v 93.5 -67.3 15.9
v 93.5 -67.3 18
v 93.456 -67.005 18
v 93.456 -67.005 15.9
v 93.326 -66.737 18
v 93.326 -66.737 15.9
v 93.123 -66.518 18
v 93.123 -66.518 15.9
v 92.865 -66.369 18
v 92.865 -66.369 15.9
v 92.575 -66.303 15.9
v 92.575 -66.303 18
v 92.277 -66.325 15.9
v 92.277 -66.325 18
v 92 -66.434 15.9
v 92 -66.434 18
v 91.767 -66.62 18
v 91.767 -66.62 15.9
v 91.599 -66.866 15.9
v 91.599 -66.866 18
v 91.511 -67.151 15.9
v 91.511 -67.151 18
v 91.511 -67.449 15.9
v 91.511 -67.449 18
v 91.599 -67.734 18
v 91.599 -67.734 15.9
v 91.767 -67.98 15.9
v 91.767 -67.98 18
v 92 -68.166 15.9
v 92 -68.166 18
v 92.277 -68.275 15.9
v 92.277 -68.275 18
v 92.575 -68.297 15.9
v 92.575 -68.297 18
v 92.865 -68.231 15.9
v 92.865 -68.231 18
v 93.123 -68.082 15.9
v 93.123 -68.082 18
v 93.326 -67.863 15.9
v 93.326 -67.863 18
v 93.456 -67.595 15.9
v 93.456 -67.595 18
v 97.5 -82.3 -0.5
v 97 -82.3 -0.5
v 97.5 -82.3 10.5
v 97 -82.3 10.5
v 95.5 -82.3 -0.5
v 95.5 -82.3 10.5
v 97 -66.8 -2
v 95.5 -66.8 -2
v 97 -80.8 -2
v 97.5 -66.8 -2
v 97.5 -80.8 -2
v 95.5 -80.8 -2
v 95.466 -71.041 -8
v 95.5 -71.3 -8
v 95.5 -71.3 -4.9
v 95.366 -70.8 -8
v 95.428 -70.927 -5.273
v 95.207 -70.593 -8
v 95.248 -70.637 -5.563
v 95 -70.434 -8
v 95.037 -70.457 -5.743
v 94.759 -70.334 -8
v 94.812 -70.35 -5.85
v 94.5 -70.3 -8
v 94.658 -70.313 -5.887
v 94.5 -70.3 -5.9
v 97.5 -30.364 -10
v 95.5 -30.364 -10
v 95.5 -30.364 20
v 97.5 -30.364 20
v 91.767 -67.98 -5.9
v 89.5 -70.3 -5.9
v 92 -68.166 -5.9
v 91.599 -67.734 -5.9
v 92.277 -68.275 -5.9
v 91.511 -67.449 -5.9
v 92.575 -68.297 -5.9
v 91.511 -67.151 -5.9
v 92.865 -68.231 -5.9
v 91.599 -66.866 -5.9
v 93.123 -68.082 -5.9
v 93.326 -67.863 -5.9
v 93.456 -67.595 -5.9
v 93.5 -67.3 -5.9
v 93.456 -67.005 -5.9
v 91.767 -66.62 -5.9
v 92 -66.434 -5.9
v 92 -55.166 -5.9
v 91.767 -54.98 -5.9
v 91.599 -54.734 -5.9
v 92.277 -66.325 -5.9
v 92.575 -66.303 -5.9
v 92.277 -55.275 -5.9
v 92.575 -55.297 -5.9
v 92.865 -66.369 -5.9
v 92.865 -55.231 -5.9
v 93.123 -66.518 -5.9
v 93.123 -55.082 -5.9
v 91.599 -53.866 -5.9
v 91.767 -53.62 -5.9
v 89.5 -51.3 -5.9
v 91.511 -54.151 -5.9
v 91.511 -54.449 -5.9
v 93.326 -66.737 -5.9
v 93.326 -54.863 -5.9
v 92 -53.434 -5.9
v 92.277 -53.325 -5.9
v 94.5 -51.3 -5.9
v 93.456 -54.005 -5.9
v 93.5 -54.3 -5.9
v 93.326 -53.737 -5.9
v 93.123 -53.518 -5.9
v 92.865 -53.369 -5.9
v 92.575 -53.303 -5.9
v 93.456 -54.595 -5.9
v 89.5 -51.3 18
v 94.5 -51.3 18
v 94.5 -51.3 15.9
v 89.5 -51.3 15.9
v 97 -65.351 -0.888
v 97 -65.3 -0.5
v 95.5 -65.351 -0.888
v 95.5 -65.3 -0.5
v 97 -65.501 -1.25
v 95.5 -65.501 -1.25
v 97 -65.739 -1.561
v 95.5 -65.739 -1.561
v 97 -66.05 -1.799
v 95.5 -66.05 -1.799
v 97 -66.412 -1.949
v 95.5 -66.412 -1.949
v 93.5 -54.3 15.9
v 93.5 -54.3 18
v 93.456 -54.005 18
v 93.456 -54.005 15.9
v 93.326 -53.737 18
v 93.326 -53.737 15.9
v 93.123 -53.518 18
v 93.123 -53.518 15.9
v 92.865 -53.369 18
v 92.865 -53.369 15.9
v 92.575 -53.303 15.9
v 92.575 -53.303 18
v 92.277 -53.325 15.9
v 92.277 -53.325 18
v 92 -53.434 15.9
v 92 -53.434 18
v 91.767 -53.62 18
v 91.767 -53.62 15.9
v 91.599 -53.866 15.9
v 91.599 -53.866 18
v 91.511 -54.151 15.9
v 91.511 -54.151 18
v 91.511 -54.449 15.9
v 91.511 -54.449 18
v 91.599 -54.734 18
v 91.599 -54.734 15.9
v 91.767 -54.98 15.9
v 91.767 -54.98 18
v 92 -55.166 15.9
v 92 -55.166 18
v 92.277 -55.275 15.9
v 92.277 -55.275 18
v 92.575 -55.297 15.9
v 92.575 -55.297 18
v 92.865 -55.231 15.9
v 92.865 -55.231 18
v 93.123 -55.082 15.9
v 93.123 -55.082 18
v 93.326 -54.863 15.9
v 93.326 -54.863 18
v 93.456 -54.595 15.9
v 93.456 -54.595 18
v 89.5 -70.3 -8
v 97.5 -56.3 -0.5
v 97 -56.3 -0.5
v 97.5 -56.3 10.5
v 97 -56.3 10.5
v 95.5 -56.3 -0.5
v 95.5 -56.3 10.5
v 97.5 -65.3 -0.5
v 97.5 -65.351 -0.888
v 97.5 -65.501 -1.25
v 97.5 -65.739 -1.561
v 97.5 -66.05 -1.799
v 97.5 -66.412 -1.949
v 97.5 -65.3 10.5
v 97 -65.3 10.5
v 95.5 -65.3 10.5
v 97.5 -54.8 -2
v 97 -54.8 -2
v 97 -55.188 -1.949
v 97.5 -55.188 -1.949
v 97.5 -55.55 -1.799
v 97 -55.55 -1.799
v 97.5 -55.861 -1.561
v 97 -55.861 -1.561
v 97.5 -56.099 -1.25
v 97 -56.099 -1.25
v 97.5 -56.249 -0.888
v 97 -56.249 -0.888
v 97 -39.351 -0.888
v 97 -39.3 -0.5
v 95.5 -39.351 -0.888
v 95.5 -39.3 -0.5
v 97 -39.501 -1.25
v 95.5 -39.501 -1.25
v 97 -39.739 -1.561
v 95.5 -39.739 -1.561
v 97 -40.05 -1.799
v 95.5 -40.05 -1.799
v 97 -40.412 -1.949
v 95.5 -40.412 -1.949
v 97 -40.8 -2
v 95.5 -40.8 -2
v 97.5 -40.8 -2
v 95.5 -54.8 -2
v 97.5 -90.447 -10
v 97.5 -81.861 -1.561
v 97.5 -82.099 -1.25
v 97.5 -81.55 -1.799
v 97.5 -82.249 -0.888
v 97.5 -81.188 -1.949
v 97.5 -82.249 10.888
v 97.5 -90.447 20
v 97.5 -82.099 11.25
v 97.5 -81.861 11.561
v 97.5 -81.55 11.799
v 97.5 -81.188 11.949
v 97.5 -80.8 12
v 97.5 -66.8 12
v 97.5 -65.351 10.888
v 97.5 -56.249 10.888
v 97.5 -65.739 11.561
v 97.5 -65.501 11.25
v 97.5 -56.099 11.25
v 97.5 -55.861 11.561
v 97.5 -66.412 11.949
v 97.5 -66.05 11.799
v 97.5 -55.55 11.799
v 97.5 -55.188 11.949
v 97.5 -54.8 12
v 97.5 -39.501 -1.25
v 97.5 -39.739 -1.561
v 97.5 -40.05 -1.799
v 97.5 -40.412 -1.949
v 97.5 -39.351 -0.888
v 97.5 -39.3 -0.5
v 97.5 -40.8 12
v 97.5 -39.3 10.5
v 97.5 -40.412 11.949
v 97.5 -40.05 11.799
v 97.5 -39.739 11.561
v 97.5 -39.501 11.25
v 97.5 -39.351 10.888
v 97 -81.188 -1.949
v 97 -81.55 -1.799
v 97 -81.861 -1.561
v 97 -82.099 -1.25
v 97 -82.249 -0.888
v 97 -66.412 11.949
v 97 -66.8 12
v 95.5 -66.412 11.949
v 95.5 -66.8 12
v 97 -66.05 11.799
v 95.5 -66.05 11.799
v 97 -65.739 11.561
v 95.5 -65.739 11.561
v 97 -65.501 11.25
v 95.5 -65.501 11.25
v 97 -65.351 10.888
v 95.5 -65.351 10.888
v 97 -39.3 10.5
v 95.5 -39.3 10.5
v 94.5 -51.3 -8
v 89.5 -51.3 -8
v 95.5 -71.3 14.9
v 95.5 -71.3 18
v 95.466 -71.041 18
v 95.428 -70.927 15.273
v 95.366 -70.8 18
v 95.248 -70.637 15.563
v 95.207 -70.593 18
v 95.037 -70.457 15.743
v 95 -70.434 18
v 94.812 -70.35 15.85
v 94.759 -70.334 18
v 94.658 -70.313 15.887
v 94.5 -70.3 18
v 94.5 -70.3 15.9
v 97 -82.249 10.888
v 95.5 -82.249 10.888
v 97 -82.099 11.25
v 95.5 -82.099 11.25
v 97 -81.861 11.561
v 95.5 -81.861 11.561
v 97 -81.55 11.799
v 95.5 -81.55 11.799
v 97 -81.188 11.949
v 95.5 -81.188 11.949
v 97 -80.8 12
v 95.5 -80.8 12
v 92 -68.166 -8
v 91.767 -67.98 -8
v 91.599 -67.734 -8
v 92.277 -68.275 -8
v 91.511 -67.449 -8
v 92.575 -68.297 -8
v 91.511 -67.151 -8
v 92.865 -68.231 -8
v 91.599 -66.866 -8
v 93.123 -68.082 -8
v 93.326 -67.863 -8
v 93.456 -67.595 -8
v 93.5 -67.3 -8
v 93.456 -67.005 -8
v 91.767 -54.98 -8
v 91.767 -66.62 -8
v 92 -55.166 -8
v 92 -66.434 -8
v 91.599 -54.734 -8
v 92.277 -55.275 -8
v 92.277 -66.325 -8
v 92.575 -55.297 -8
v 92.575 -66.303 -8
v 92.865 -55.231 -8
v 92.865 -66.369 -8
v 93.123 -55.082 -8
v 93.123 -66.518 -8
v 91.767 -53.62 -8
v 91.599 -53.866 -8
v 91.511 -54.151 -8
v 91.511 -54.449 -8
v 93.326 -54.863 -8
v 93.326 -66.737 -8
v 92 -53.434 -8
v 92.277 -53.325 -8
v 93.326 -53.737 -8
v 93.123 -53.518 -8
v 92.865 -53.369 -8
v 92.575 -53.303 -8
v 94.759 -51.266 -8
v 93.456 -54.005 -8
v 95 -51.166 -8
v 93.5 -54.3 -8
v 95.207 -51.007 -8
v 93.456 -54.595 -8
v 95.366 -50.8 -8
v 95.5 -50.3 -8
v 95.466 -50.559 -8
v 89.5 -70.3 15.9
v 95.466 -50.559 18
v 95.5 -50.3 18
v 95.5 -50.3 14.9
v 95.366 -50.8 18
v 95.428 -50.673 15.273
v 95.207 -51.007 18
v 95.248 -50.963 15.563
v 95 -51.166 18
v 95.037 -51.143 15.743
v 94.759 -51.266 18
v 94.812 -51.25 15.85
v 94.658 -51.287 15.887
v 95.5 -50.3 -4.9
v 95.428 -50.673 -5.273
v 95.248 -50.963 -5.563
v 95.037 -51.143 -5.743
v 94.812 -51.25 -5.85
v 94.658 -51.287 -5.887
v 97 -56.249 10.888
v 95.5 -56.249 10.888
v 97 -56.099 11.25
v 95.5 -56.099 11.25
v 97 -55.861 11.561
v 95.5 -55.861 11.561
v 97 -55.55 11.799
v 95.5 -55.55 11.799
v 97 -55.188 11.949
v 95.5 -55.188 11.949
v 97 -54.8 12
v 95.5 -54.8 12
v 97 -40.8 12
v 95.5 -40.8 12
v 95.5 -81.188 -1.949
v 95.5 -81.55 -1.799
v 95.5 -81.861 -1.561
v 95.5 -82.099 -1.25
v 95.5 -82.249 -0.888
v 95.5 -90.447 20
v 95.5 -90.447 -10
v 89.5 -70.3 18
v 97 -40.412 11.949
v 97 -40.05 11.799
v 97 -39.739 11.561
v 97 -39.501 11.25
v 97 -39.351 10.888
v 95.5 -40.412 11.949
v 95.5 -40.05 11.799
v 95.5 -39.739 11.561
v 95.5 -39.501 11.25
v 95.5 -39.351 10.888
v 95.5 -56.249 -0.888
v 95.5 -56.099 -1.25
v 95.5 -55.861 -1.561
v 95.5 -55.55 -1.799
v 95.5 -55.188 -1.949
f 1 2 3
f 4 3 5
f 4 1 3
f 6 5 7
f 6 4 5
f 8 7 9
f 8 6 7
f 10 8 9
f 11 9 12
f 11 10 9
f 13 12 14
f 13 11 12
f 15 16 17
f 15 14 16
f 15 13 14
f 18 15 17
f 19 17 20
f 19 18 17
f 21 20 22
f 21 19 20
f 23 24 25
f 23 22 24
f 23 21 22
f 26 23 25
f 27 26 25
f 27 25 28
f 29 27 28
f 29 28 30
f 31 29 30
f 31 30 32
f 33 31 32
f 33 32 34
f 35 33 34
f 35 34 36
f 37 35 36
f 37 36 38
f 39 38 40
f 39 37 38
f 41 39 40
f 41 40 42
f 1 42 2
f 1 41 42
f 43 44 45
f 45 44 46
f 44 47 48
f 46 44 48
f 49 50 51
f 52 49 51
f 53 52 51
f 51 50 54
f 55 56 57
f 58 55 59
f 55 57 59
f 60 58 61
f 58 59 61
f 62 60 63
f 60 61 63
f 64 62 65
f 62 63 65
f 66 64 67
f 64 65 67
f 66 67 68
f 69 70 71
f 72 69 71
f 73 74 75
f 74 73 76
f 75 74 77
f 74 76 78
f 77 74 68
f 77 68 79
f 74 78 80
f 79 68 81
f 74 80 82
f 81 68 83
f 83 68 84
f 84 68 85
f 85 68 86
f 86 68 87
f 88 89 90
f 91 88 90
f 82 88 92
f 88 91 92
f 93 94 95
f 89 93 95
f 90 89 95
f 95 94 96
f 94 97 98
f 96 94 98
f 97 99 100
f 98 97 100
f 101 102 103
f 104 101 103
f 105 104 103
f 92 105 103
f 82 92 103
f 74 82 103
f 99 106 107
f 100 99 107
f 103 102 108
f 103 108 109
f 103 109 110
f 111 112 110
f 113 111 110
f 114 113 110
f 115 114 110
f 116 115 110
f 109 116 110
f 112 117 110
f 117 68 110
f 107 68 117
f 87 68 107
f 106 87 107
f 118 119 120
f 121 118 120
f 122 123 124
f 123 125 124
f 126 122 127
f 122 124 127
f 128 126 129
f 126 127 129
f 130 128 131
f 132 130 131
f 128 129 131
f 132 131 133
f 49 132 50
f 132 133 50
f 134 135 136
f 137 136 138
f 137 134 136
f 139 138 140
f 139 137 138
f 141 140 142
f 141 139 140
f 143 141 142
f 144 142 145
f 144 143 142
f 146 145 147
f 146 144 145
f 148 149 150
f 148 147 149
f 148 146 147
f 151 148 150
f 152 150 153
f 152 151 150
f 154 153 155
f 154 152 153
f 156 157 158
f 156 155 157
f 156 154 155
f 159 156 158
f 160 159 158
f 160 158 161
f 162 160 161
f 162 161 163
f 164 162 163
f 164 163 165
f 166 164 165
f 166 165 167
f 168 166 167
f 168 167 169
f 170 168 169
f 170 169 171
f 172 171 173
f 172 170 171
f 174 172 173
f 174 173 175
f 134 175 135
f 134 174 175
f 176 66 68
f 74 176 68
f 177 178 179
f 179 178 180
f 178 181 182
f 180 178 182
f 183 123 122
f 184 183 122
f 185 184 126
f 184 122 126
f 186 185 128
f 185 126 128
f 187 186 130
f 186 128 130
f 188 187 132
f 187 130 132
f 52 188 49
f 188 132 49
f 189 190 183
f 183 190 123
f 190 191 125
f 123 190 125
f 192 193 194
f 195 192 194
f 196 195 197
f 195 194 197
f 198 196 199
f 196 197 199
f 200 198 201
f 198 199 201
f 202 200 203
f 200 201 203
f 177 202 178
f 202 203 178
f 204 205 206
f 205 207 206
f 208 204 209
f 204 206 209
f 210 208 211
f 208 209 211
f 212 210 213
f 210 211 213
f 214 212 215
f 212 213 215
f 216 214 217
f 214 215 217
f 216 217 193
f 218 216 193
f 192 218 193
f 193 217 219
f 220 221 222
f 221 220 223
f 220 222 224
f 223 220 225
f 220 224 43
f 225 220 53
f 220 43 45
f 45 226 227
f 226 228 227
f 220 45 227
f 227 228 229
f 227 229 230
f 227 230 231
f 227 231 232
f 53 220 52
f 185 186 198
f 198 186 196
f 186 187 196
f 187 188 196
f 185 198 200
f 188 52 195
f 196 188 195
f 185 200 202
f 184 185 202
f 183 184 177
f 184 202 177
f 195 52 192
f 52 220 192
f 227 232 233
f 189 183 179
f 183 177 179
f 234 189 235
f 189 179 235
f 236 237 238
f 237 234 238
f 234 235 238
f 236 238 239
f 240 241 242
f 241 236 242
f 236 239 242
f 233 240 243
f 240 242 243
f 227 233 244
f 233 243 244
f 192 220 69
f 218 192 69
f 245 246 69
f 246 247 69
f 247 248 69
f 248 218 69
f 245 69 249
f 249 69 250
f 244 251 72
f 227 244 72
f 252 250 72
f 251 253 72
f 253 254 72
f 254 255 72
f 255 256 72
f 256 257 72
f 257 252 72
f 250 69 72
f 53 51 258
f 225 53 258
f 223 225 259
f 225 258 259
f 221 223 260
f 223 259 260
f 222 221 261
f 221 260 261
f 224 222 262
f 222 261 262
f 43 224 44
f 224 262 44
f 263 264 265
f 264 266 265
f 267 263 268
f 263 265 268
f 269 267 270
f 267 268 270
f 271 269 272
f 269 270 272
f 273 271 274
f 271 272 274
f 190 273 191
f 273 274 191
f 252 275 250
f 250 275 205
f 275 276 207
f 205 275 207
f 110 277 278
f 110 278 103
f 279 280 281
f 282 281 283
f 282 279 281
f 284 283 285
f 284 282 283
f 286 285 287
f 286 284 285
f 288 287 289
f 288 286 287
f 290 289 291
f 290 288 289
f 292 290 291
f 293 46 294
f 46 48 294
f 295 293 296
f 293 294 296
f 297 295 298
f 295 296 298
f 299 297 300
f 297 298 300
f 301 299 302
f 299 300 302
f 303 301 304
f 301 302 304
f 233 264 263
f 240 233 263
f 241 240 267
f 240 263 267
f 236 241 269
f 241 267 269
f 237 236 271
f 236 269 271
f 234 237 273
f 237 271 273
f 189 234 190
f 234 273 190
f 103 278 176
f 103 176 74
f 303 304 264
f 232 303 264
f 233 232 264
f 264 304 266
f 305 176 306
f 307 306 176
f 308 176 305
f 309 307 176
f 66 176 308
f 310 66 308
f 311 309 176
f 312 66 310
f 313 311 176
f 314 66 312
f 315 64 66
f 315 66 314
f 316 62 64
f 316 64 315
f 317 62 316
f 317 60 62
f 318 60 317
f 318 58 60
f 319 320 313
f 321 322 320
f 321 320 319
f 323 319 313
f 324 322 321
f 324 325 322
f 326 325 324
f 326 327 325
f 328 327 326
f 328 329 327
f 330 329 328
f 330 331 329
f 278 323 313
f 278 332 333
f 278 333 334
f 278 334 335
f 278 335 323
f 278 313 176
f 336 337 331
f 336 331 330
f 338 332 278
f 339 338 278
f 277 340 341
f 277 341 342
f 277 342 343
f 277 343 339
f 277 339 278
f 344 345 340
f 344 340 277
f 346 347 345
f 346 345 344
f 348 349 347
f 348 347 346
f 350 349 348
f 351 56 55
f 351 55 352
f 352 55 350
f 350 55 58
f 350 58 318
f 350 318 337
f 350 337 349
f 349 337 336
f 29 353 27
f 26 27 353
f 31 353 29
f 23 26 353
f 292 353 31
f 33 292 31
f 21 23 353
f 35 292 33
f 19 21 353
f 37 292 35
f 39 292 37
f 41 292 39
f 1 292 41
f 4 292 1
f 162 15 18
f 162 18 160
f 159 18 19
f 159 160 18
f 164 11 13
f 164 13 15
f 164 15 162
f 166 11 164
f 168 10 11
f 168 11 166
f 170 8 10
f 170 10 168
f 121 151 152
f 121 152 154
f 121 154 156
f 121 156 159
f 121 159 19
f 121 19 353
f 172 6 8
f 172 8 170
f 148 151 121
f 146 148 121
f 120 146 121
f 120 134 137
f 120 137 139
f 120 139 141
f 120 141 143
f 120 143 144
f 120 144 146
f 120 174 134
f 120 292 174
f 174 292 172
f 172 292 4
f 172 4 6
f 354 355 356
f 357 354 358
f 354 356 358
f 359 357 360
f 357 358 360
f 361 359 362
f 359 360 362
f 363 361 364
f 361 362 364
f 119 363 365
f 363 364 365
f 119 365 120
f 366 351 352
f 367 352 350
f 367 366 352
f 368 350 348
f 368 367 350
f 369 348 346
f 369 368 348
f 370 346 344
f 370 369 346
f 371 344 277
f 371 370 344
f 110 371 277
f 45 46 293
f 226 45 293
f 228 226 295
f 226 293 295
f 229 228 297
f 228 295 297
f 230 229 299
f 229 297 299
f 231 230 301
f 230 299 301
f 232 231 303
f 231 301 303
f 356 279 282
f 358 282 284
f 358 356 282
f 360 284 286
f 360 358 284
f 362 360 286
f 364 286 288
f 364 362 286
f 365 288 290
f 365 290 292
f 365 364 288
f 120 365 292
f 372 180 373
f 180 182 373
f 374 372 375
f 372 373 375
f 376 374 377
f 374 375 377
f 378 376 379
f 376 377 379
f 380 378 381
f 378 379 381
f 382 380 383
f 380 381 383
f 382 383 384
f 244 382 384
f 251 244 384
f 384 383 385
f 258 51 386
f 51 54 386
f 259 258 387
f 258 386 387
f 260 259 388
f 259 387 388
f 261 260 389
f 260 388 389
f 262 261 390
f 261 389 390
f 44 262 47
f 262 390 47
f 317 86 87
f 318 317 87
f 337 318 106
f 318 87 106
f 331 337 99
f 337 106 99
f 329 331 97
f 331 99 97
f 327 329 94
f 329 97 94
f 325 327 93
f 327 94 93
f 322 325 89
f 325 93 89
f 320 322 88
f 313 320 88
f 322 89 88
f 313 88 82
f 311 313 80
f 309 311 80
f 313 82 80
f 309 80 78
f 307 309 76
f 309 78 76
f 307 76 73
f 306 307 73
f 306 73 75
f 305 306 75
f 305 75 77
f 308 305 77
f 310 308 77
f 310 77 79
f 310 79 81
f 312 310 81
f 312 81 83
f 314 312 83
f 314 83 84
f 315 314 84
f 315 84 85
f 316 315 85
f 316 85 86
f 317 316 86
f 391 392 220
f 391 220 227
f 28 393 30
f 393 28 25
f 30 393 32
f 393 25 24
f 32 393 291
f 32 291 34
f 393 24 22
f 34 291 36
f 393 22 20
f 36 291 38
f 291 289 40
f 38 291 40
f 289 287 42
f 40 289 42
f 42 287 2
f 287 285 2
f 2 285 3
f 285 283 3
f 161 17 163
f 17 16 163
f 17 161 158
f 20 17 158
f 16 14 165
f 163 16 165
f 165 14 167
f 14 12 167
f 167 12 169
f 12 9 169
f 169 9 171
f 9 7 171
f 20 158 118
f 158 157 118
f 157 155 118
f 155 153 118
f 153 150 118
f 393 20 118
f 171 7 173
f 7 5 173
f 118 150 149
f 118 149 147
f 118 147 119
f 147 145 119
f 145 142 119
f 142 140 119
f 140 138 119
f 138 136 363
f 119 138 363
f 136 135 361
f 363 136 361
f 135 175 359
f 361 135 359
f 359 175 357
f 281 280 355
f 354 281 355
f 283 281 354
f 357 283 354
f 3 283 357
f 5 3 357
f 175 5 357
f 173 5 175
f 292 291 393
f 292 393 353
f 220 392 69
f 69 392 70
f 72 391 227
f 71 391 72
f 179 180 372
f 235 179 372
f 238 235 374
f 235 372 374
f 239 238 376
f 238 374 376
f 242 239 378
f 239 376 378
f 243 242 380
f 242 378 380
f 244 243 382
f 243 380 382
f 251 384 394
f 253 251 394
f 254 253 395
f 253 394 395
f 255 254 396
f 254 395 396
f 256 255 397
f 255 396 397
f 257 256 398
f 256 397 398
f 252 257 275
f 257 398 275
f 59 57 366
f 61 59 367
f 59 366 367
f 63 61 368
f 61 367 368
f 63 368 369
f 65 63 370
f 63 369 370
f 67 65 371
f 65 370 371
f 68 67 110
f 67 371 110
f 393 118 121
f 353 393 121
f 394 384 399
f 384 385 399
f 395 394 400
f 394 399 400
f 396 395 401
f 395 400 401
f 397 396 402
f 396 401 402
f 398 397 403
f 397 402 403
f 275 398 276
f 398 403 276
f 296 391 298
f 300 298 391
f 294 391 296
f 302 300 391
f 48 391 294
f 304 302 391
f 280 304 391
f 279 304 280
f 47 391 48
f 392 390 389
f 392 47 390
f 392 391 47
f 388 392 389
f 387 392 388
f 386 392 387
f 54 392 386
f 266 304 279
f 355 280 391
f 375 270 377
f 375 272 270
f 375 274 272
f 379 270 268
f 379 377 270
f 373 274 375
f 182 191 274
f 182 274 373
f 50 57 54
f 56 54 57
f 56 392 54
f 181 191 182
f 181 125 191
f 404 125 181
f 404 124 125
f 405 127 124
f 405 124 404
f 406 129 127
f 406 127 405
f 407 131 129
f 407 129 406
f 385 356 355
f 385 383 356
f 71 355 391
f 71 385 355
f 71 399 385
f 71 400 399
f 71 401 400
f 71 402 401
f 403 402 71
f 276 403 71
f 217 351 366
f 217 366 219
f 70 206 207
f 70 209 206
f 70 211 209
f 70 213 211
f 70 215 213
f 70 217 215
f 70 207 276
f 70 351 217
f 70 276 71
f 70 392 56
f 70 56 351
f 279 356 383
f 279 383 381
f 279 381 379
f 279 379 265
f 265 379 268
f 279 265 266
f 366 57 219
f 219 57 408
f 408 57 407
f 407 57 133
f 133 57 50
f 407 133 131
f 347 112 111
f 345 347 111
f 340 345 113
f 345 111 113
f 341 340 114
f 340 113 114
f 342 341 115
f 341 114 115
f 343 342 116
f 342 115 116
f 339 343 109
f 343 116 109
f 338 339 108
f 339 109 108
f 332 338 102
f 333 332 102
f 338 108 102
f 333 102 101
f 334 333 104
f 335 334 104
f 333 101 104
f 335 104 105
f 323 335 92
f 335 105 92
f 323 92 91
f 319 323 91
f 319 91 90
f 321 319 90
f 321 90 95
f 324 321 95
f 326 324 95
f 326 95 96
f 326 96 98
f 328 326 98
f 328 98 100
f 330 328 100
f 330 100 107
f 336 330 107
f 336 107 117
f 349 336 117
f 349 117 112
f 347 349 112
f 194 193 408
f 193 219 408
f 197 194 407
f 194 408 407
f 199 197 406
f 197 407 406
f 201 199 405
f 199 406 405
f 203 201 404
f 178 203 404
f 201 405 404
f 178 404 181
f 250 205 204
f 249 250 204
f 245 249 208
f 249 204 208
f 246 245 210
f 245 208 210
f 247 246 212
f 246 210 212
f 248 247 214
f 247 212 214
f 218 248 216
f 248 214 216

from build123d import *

# Parameters (mm, degrees)
CUT_EXTRUDE8_START       = -10
CUT_EXTRUDE8_OUTLINE_W   = 1.5
CUT_EXTRUDE8_OUTLINE_H   = 9
CUT_EXTRUDE8_DEPTH       = 30
CUT_EXTRUDE8_2_OUTLINE_W = 1.5
CUT_EXTRUDE8_2_OUTLINE_H = 17
CUT_EXTRUDE8_2_DEPTH     = 9.5
CUT_EXTRUDE8_START_2     = 10.5
CUT_EXTRUDE8_3_OUTLINE_W = 1.5
CUT_EXTRUDE8_3_OUTLINE_H = 17
CUT_EXTRUDE8_3_DEPTH     = 9.5
CUT_EXTRUDE9_START       = -2
CUT_EXTRUDE9_DEPTH       = 3
SKETCH8_W                = 44.763309207
SKETCH8_H                = 3.029199698
CUT_EXTRUDE10_DEPTH      = 21
SKETCH9_W                = 30
SKETCH9_H                = 60.083837712
BOSS_EXTRUDE3_DEPTH      = 2
SKETCH13_W               = 2.1
SKETCH13_H               = 19
BOSS_EXTRUDE5_DEPTH      = 6
SKETCH14_R               = 1
CUT_EXTRUDE12_DEPTH      = 6
FILLET1_R                = 1
FILLET1_OF_MIRROR1_R     = 1


with BuildPart() as part:
    # Cut-Extrude8: read off the stored shape, not the designer's step
    # Cut-Extrude8 outline → Cut-Extrude8 (new body)
    with BuildSketch(Plane.XY.offset(CUT_EXTRUDE8_START)):
        with BuildLine():
            Line((97, -39.3), (97, -32.3))
            ThreePointArc((97, -32.3), (96.58113883, -31.075255129), (95.5, -30.363508327))
            Line((95.5, -30.363508327), (95.5, -39.3))
            Line((95.5, -39.3), (97, -39.3))
        make_face()
        with Locations((96.25, -60.8)):
            Rectangle(CUT_EXTRUDE8_OUTLINE_W, CUT_EXTRUDE8_OUTLINE_H)
        with BuildLine():
            Line((97, -90.447346039), (97, -82.3))
            Line((97, -82.3), (95.5, -82.3))
            Line((95.5, -82.3), (95.5, -94.921216129))
            Line((95.5, -94.921216129), (96.879385242, -91.131386325))
            ThreePointArc((96.879385242, -91.131386325), (96.969615506, -90.794642394), (97, -90.447346039))
        make_face()
    extrude(amount=CUT_EXTRUDE8_DEPTH)

    # Cut-Extrude8 2 outline → Cut-Extrude8 2 (add)
    with BuildSketch(Plane.XY.offset(CUT_EXTRUDE8_START)):
        with Locations((96.25, -47.8)):
            Rectangle(CUT_EXTRUDE8_2_OUTLINE_W, CUT_EXTRUDE8_2_OUTLINE_H)
        with Locations((96.25, -73.8)):
            Rectangle(CUT_EXTRUDE8_2_OUTLINE_W, CUT_EXTRUDE8_2_OUTLINE_H)
    extrude(amount=CUT_EXTRUDE8_2_DEPTH)

    # Cut-Extrude8 3 outline → Cut-Extrude8 3 (add)
    with BuildSketch(Plane.XY.offset(CUT_EXTRUDE8_START_2)):
        with Locations((96.25, -47.8)):
            Rectangle(CUT_EXTRUDE8_3_OUTLINE_W, CUT_EXTRUDE8_3_OUTLINE_H)
        with Locations((96.25, -73.8)):
            Rectangle(CUT_EXTRUDE8_3_OUTLINE_W, CUT_EXTRUDE8_3_OUTLINE_H)
    extrude(amount=CUT_EXTRUDE8_3_DEPTH)

    # Cut-Extrude8 4: loft between two sections, ruled curve by curve
    cut_extrude8_4_from = [
        Edge.make_three_point_arc((94.954911098, -94.722819994, 16.513911403), (95.320152625, -93.719327147, 16.565596562), (95.497858615, -93.231083953, 17.5)),
        Edge.make_three_point_arc((95.497858615, -93.231083953, 17.5), (95.320152625, -93.719327147, 18.434403438), (94.954911098, -94.722819994, 18.486088597)),
        Edge.make_line((94.954911098, -94.722819994, 18.486088597), (94.954911098, -94.722819994, 16.513911403)),
    ]
    cut_extrude8_4_to = [
        Edge.make_three_point_arc((95.5, -94.921216129, 16.513911403), (95.865241526, -93.917723283, 16.565596562), (96.042947516, -93.429480088, 17.5)),
        Edge.make_three_point_arc((96.042947516, -93.429480088, 17.5), (95.865241526, -93.917723283, 18.434403438), (95.5, -94.921216129, 18.486088597)),
        Edge.make_line((95.5, -94.921216129, 18.486088597), (95.5, -94.921216129, 16.513911403)),
    ]
    cut_extrude8_4 = Solid(Shell([*[Face.make_surface_from_curves(cut_extrude8_4_from[k], cut_extrude8_4_to[k]) for k in range(3)], Face(Wire(cut_extrude8_4_from)), Face(Wire(cut_extrude8_4_to))]))
    add(cut_extrude8_4, mode=Mode.SUBTRACT)

    # Cut-Extrude8 5: loft between two sections, ruled curve by curve
    cut_extrude8_5_from = [
        Edge.make_three_point_arc((94.954911098, -94.722819994, -8.486088597), (95.320152625, -93.719327147, -8.434403438), (95.497858615, -93.231083953, -7.5)),
        Edge.make_three_point_arc((95.497858615, -93.231083953, -7.5), (95.320152625, -93.719327147, -6.565596562), (94.954911098, -94.722819994, -6.513911403)),
        Edge.make_line((94.954911098, -94.722819994, -6.513911403), (94.954911098, -94.722819994, -8.486088597)),
    ]
    cut_extrude8_5_to = [
        Edge.make_three_point_arc((95.5, -94.921216129, -8.486088597), (95.865241526, -93.917723283, -8.434403438), (96.042947516, -93.429480088, -7.5)),
        Edge.make_three_point_arc((96.042947516, -93.429480088, -7.5), (95.865241526, -93.917723283, -6.565596562), (95.5, -94.921216129, -6.513911403)),
        Edge.make_line((95.5, -94.921216129, -6.513911403), (95.5, -94.921216129, -8.486088597)),
    ]
    cut_extrude8_5 = Solid(Shell([*[Face.make_surface_from_curves(cut_extrude8_5_from[k], cut_extrude8_5_to[k]) for k in range(3)], Face(Wire(cut_extrude8_5_from)), Face(Wire(cut_extrude8_5_to))]))
    add(cut_extrude8_5, mode=Mode.SUBTRACT)

    # Cut-Extrude8 6: loft between two sections, ruled curve by curve
    cut_extrude8_6_from = [
        Edge.make_three_point_arc((97, -54.8, -2), (97, -55.860660172, -1.560660172), (97, -56.3, -0.5)),
        Edge.make_three_point_arc((97, -39.3, -0.5), (97, -39.739339828, -1.560660172), (97, -40.8, -2)),
        Edge.make_line((97, -40.8, -2), (97, -54.8, -2)),
        Edge.make_line((97, -39.3, -0.5), (97, -56.3, -0.5)),
    ]
    cut_extrude8_6_to = [
        Edge.make_three_point_arc((95.5, -54.8, -2), (95.5, -55.860660172, -1.560660172), (95.5, -56.3, -0.5)),
        Edge.make_three_point_arc((95.5, -39.3, -0.5), (95.5, -39.739339828, -1.560660172), (95.5, -40.8, -2)),
        Edge.make_line((95.5, -40.8, -2), (95.5, -54.8, -2)),
        Edge.make_line((95.5, -39.3, -0.5), (95.5, -56.3, -0.5)),
    ]
    cut_extrude8_6 = Solid(Shell([*[Face.make_surface_from_curves(cut_extrude8_6_from[k], cut_extrude8_6_to[k]) for k in range(4)], Face(Wire(cut_extrude8_6_from)), Face(Wire(cut_extrude8_6_to))]))
    add(cut_extrude8_6, mode=Mode.SUBTRACT)

    # Cut-Extrude8 7: loft between two sections, ruled curve by curve
    cut_extrude8_7_from = [
        Edge.make_three_point_arc((97, -65.3, -0.5), (97, -65.739339828, -1.560660172), (97, -66.8, -2)),
        Edge.make_three_point_arc((97, -80.8, -2), (97, -81.860660172, -1.560660172), (97, -82.3, -0.5)),
        Edge.make_line((97, -66.8, -2), (97, -80.8, -2)),
        Edge.make_line((97, -82.3, -0.5), (97, -65.3, -0.5)),
    ]
    cut_extrude8_7_to = [
        Edge.make_three_point_arc((95.5, -65.3, -0.5), (95.5, -65.739339828, -1.560660172), (95.5, -66.8, -2)),
        Edge.make_three_point_arc((95.5, -80.8, -2), (95.5, -81.860660172, -1.560660172), (95.5, -82.3, -0.5)),
        Edge.make_line((95.5, -66.8, -2), (95.5, -80.8, -2)),
        Edge.make_line((95.5, -82.3, -0.5), (95.5, -65.3, -0.5)),
    ]
    cut_extrude8_7 = Solid(Shell([*[Face.make_surface_from_curves(cut_extrude8_7_from[k], cut_extrude8_7_to[k]) for k in range(4)], Face(Wire(cut_extrude8_7_from)), Face(Wire(cut_extrude8_7_to))]))
    add(cut_extrude8_7, mode=Mode.SUBTRACT)

    # Cut-Extrude8 8: loft between two sections, ruled curve by curve
    cut_extrude8_8_from = [
        Edge.make_three_point_arc((97, -56.3, 10.5), (97, -55.860660172, 11.560660172), (97, -54.8, 12)),
        Edge.make_three_point_arc((97, -40.8, 12), (97, -39.739339828, 11.560660172), (97, -39.3, 10.5)),
        Edge.make_line((97, -40.8, 12), (97, -54.8, 12)),
        Edge.make_line((97, -39.3, 10.5), (97, -56.3, 10.5)),
    ]
    cut_extrude8_8_to = [
        Edge.make_three_point_arc((95.5, -56.3, 10.5), (95.5, -55.860660172, 11.560660172), (95.5, -54.8, 12)),
        Edge.make_three_point_arc((95.5, -40.8, 12), (95.5, -39.739339828, 11.560660172), (95.5, -39.3, 10.5)),
        Edge.make_line((95.5, -40.8, 12), (95.5, -54.8, 12)),
        Edge.make_line((95.5, -39.3, 10.5), (95.5, -56.3, 10.5)),
    ]
    cut_extrude8_8 = Solid(Shell([*[Face.make_surface_from_curves(cut_extrude8_8_from[k], cut_extrude8_8_to[k]) for k in range(4)], Face(Wire(cut_extrude8_8_from)), Face(Wire(cut_extrude8_8_to))]))
    add(cut_extrude8_8, mode=Mode.SUBTRACT)

    # Cut-Extrude8 9: loft between two sections, ruled curve by curve
    cut_extrude8_9_from = [
        Edge.make_three_point_arc((97, -82.3, 10.5), (97, -81.860660172, 11.560660172), (97, -80.8, 12)),
        Edge.make_three_point_arc((97, -66.8, 12), (97, -65.739339828, 11.560660172), (97, -65.3, 10.5)),
        Edge.make_line((97, -66.8, 12), (97, -80.8, 12)),
        Edge.make_line((97, -65.3, 10.5), (97, -82.3, 10.5)),
    ]
    cut_extrude8_9_to = [
        Edge.make_three_point_arc((95.5, -82.3, 10.5), (95.5, -81.860660172, 11.560660172), (95.5, -80.8, 12)),
        Edge.make_three_point_arc((95.5, -66.8, 12), (95.5, -65.739339828, 11.560660172), (95.5, -65.3, 10.5)),
        Edge.make_line((95.5, -66.8, 12), (95.5, -80.8, 12)),
        Edge.make_line((95.5, -65.3, 10.5), (95.5, -82.3, 10.5)),
    ]
    cut_extrude8_9 = Solid(Shell([*[Face.make_surface_from_curves(cut_extrude8_9_from[k], cut_extrude8_9_to[k]) for k in range(4)], Face(Wire(cut_extrude8_9_from)), Face(Wire(cut_extrude8_9_to))]))
    add(cut_extrude8_9, mode=Mode.SUBTRACT)

    # Cut-Extrude8 10: loft between two sections, ruled curve by curve
    cut_extrude8_10_from = [
        Edge.make_three_point_arc((95.5, -75.3, 16.4), (95.5, -74.2, 17.5), (95.5, -75.3, 18.6)),
        Edge.make_three_point_arc((95.5, -75.3, 18.6), (95.5, -76.4, 17.5), (95.5, -75.3, 16.4)),
    ]
    cut_extrude8_10_to = [
        Edge.make_three_point_arc((97, -75.3, 16.4), (97, -74.2, 17.5), (97, -75.3, 18.6)),
        Edge.make_three_point_arc((97, -75.3, 18.6), (97, -76.4, 17.5), (97, -75.3, 16.4)),
    ]
    cut_extrude8_10 = Solid(Shell([*[Face.make_surface_from_curves(cut_extrude8_10_from[k], cut_extrude8_10_to[k]) for k in range(2)], Face(Wire(cut_extrude8_10_from)), Face(Wire(cut_extrude8_10_to))]))
    add(cut_extrude8_10, mode=Mode.SUBTRACT)

    # Cut-Extrude8 11: loft between two sections, ruled curve by curve
    cut_extrude8_11_from = [
        Edge.make_three_point_arc((95.5, -46.3, 16.4), (95.5, -45.2, 17.5), (95.5, -46.3, 18.6)),
        Edge.make_three_point_arc((95.5, -46.3, 18.6), (95.5, -47.4, 17.5), (95.5, -46.3, 16.4)),
    ]
    cut_extrude8_11_to = [
        Edge.make_three_point_arc((97, -46.3, 16.4), (97, -45.2, 17.5), (97, -46.3, 18.6)),
        Edge.make_three_point_arc((97, -46.3, 18.6), (97, -47.4, 17.5), (97, -46.3, 16.4)),
    ]
    cut_extrude8_11 = Solid(Shell([*[Face.make_surface_from_curves(cut_extrude8_11_from[k], cut_extrude8_11_to[k]) for k in range(2)], Face(Wire(cut_extrude8_11_from)), Face(Wire(cut_extrude8_11_to))]))
    add(cut_extrude8_11, mode=Mode.SUBTRACT)

    # Cut-Extrude8 12: loft between two sections, ruled curve by curve
    cut_extrude8_12_from = [
        Edge.make_three_point_arc((95.5, -75.3, -8.6), (95.5, -74.2, -7.5), (95.5, -75.3, -6.4)),
        Edge.make_three_point_arc((95.5, -75.3, -6.4), (95.5, -76.4, -7.5), (95.5, -75.3, -8.6)),
    ]
    cut_extrude8_12_to = [
        Edge.make_three_point_arc((97, -75.3, -8.6), (97, -74.2, -7.5), (97, -75.3, -6.4)),
        Edge.make_three_point_arc((97, -75.3, -6.4), (97, -76.4, -7.5), (97, -75.3, -8.6)),
    ]
    cut_extrude8_12 = Solid(Shell([*[Face.make_surface_from_curves(cut_extrude8_12_from[k], cut_extrude8_12_to[k]) for k in range(2)], Face(Wire(cut_extrude8_12_from)), Face(Wire(cut_extrude8_12_to))]))
    add(cut_extrude8_12, mode=Mode.SUBTRACT)

    # Cut-Extrude8 13: loft between two sections, ruled curve by curve
    cut_extrude8_13_from = [
        Edge.make_three_point_arc((95.5, -46.3, -8.6), (95.5, -45.2, -7.5), (95.5, -46.3, -6.4)),
        Edge.make_three_point_arc((95.5, -46.3, -6.4), (95.5, -47.4, -7.5), (95.5, -46.3, -8.6)),
    ]
    cut_extrude8_13_to = [
        Edge.make_three_point_arc((97, -46.3, -8.6), (97, -45.2, -7.5), (97, -46.3, -6.4)),
        Edge.make_three_point_arc((97, -46.3, -6.4), (97, -47.4, -7.5), (97, -46.3, -8.6)),
    ]
    cut_extrude8_13 = Solid(Shell([*[Face.make_surface_from_curves(cut_extrude8_13_from[k], cut_extrude8_13_to[k]) for k in range(2)], Face(Wire(cut_extrude8_13_from)), Face(Wire(cut_extrude8_13_to))]))
    add(cut_extrude8_13, mode=Mode.SUBTRACT)

    # Cut-Extrude9: read off the stored shape, not the designer's step
    # Cut-Extrude9 outline → Cut-Extrude9 (cut)
    with BuildSketch(Plane.ZY.offset(-95.5).offset(CUT_EXTRUDE9_START)):
        with BuildLine():
            Line((-10, -94.921216129), (-8.486088597, -94.921216129))
            add(Edge.make_bspline(
                [(-8.486088597, -94.921216129), (-8.528622211, -94.840365377), (-8.56433173, -94.750294794), (-8.590341572, -94.651077369), (-8.602806532, -94.544671361), (-8.590253721, -94.116362583), (-8.444290191, -93.745116805), (-8.117111171, -93.513621081), (-7.777782646, -93.429480088), (-7.222217354, -93.429480088), (-6.882888829, -93.513621081), (-6.555709809, -93.745116805), (-6.409746279, -94.116362583), (-6.397193468, -94.544671361), (-6.409658428, -94.651077369), (-6.43566827, -94.750294794), (-6.471377789, -94.840365377), (-6.513911403, -94.921216129)],
                knots=[6.221037859, 6.221037859, 6.221037859, 6.221037859, 6.221037859, 6.221037859, 6.742302252, 6.742302252, 6.742302252, 6.742302252, 8.250951131, 8.250951131, 8.250951131, 8.250951131, 9.75960001, 9.75960001, 9.75960001, 9.75960001, 10.280864403, 10.280864403, 10.280864403, 10.280864403, 10.280864403, 10.280864403], degree=5, weights=[1, 1, 1.000250109, 1.000114964, 1, 1, 0.966437741, 0.979277403, 1, 1, 0.979277403, 0.966437741, 1, 1, 1.000114964, 1.000250109, 1, 1]))
            Line((-6.513911403, -94.921216129), (16.513911403, -94.921216129))
            add(Edge.make_bspline(
                [(16.513911403, -94.921216129), (16.471377789, -94.840365377), (16.43566827, -94.750294794), (16.409658428, -94.651077369), (16.397193468, -94.544671361), (16.409746279, -94.116362583), (16.555709809, -93.745116805), (16.882888829, -93.513621081), (17.222217354, -93.429480088), (17.777782646, -93.429480088), (18.117111171, -93.513621081), (18.444290191, -93.745116805), (18.590253721, -94.116362583), (18.602806532, -94.544671361), (18.590341572, -94.651077369), (18.56433173, -94.750294794), (18.528622211, -94.840365377), (18.486088597, -94.921216129)],
                knots=[6.221037859, 6.221037859, 6.221037859, 6.221037859, 6.221037859, 6.221037859, 6.742302252, 6.742302252, 6.742302252, 6.742302252, 8.250951131, 8.250951131, 8.250951131, 8.250951131, 9.75960001, 9.75960001, 9.75960001, 9.75960001, 10.280864403, 10.280864403, 10.280864403, 10.280864403, 10.280864403, 10.280864403], degree=5, weights=[1, 1, 1.000250109, 1.000114964, 1, 1, 0.966437741, 0.979277403, 1, 1, 0.979277403, 0.966437741, 1, 1, 1.000114964, 1.000250109, 1, 1]))
            Line((18.486088597, -94.921216129), (20, -94.921216129))
            Line((20, -94.921216129), (20, -90.447346039))
            Line((20, -90.447346039), (-10, -90.447346039))
            Line((-10, -90.447346039), (-10, -94.921216129))
        make_face()
    extrude(amount=CUT_EXTRUDE9_DEPTH, mode=Mode.SUBTRACT)

    # Sketch8 → Cut-Extrude10 (cut, symmetric)
    with BuildSketch(Plane.ZY.offset(-95.5)):
        with Locations((1.902623412, -94.949992123)):
            Rectangle(SKETCH8_W, SKETCH8_H)
    extrude(amount=CUT_EXTRUDE10_DEPTH, both=True, mode=Mode.SUBTRACT)

    # Sketch9 → Boss-Extrude3 (add)
    with BuildSketch(Plane.ZY.offset(-95.5)):
        with Locations((5, -60.405427183)):
            Rectangle(SKETCH9_W, SKETCH9_H)
        with BuildLine():
            Line((-0.5, -82.3), (10.5, -82.3))
            ThreePointArc((10.5, -82.3), (11.560660172, -81.860660172), (12, -80.8))
            Line((12, -80.8), (12, -66.8))
            ThreePointArc((12, -66.8), (11.560660172, -65.739339828), (10.5, -65.3))
            Line((10.5, -65.3), (-0.5, -65.3))
            ThreePointArc((-0.5, -65.3), (-1.560660172, -65.739339828), (-2, -66.8))
            Line((-2, -66.8), (-2, -80.8))
            ThreePointArc((-2, -80.8), (-1.560660172, -81.860660172), (-0.5, -82.3))
        make_face(mode=Mode.SUBTRACT)
        with BuildLine():
            Line((12, -54.8), (12, -40.8))
            ThreePointArc((12, -40.8), (11.560660172, -39.739339828), (10.5, -39.3))
            Line((10.5, -39.3), (-0.5, -39.3))
            ThreePointArc((-0.5, -39.3), (-1.560660172, -39.739339828), (-2, -40.8))
            Line((-2, -40.8), (-2, -54.8))
            ThreePointArc((-2, -54.8), (-1.560660172, -55.860660172), (-0.5, -56.3))
            Line((-0.5, -56.3), (10.5, -56.3))
            ThreePointArc((10.5, -56.3), (11.560660172, -55.860660172), (12, -54.8))
        make_face(mode=Mode.SUBTRACT)
    extrude(amount=-BOSS_EXTRUDE3_DEPTH)

    # Sketch13 → Boss-Extrude5 (add)
    with BuildSketch(Plane.ZY.offset(-95.5)):
        with Locations((-6.95, -60.8)):
            Rectangle(SKETCH13_W, SKETCH13_H)
    boss_extrude5 = extrude(amount=BOSS_EXTRUDE5_DEPTH)

    # Sketch14 → Cut-Extrude12 (cut)
    with BuildSketch(Plane.XY.offset(-5.9)):
        with Locations((92.5, -54.3)):
            Circle(SKETCH14_R)
        with Locations((92.5, -67.3)):
            Circle(SKETCH14_R)
    cut_extrude12 = extrude(amount=-CUT_EXTRUDE12_DEPTH, mode=Mode.SUBTRACT)

    # Fillet1
    fillet1_edges = [part.edges().sort_by_distance(p)[0] for p in [
        (95.5, -51.3, -6.95),
        (95.5, -70.3, -6.95),
        (95.5, -60.8, -5.9),
    ]]
    fillet(fillet1_edges, radius=FILLET1_R)

    # Mirror1: Boss-Extrude5, Cut-Extrude12 across plane
    add(boss_extrude5.mirror(Plane(origin=(0, 0, 5), x_dir=(1, 0, 0), z_dir=(0, 0, -1))))
    add(cut_extrude12.mirror(Plane(origin=(0, 0, 5), x_dir=(1, 0, 0), z_dir=(0, 0, -1))), mode=Mode.SUBTRACT)

    # Fillet1 of Mirror1
    fillet1_of_mirror1_edges = [part.edges().sort_by_distance(p)[0] for p in [
        (95.5, -51.3, 16.95),
        (95.5, -70.3, 16.95),
        (95.5, -60.8, 15.9),
    ]]
    fillet(fillet1_of_mirror1_edges, radius=FILLET1_OF_MIRROR1_R)


solid = part.part
